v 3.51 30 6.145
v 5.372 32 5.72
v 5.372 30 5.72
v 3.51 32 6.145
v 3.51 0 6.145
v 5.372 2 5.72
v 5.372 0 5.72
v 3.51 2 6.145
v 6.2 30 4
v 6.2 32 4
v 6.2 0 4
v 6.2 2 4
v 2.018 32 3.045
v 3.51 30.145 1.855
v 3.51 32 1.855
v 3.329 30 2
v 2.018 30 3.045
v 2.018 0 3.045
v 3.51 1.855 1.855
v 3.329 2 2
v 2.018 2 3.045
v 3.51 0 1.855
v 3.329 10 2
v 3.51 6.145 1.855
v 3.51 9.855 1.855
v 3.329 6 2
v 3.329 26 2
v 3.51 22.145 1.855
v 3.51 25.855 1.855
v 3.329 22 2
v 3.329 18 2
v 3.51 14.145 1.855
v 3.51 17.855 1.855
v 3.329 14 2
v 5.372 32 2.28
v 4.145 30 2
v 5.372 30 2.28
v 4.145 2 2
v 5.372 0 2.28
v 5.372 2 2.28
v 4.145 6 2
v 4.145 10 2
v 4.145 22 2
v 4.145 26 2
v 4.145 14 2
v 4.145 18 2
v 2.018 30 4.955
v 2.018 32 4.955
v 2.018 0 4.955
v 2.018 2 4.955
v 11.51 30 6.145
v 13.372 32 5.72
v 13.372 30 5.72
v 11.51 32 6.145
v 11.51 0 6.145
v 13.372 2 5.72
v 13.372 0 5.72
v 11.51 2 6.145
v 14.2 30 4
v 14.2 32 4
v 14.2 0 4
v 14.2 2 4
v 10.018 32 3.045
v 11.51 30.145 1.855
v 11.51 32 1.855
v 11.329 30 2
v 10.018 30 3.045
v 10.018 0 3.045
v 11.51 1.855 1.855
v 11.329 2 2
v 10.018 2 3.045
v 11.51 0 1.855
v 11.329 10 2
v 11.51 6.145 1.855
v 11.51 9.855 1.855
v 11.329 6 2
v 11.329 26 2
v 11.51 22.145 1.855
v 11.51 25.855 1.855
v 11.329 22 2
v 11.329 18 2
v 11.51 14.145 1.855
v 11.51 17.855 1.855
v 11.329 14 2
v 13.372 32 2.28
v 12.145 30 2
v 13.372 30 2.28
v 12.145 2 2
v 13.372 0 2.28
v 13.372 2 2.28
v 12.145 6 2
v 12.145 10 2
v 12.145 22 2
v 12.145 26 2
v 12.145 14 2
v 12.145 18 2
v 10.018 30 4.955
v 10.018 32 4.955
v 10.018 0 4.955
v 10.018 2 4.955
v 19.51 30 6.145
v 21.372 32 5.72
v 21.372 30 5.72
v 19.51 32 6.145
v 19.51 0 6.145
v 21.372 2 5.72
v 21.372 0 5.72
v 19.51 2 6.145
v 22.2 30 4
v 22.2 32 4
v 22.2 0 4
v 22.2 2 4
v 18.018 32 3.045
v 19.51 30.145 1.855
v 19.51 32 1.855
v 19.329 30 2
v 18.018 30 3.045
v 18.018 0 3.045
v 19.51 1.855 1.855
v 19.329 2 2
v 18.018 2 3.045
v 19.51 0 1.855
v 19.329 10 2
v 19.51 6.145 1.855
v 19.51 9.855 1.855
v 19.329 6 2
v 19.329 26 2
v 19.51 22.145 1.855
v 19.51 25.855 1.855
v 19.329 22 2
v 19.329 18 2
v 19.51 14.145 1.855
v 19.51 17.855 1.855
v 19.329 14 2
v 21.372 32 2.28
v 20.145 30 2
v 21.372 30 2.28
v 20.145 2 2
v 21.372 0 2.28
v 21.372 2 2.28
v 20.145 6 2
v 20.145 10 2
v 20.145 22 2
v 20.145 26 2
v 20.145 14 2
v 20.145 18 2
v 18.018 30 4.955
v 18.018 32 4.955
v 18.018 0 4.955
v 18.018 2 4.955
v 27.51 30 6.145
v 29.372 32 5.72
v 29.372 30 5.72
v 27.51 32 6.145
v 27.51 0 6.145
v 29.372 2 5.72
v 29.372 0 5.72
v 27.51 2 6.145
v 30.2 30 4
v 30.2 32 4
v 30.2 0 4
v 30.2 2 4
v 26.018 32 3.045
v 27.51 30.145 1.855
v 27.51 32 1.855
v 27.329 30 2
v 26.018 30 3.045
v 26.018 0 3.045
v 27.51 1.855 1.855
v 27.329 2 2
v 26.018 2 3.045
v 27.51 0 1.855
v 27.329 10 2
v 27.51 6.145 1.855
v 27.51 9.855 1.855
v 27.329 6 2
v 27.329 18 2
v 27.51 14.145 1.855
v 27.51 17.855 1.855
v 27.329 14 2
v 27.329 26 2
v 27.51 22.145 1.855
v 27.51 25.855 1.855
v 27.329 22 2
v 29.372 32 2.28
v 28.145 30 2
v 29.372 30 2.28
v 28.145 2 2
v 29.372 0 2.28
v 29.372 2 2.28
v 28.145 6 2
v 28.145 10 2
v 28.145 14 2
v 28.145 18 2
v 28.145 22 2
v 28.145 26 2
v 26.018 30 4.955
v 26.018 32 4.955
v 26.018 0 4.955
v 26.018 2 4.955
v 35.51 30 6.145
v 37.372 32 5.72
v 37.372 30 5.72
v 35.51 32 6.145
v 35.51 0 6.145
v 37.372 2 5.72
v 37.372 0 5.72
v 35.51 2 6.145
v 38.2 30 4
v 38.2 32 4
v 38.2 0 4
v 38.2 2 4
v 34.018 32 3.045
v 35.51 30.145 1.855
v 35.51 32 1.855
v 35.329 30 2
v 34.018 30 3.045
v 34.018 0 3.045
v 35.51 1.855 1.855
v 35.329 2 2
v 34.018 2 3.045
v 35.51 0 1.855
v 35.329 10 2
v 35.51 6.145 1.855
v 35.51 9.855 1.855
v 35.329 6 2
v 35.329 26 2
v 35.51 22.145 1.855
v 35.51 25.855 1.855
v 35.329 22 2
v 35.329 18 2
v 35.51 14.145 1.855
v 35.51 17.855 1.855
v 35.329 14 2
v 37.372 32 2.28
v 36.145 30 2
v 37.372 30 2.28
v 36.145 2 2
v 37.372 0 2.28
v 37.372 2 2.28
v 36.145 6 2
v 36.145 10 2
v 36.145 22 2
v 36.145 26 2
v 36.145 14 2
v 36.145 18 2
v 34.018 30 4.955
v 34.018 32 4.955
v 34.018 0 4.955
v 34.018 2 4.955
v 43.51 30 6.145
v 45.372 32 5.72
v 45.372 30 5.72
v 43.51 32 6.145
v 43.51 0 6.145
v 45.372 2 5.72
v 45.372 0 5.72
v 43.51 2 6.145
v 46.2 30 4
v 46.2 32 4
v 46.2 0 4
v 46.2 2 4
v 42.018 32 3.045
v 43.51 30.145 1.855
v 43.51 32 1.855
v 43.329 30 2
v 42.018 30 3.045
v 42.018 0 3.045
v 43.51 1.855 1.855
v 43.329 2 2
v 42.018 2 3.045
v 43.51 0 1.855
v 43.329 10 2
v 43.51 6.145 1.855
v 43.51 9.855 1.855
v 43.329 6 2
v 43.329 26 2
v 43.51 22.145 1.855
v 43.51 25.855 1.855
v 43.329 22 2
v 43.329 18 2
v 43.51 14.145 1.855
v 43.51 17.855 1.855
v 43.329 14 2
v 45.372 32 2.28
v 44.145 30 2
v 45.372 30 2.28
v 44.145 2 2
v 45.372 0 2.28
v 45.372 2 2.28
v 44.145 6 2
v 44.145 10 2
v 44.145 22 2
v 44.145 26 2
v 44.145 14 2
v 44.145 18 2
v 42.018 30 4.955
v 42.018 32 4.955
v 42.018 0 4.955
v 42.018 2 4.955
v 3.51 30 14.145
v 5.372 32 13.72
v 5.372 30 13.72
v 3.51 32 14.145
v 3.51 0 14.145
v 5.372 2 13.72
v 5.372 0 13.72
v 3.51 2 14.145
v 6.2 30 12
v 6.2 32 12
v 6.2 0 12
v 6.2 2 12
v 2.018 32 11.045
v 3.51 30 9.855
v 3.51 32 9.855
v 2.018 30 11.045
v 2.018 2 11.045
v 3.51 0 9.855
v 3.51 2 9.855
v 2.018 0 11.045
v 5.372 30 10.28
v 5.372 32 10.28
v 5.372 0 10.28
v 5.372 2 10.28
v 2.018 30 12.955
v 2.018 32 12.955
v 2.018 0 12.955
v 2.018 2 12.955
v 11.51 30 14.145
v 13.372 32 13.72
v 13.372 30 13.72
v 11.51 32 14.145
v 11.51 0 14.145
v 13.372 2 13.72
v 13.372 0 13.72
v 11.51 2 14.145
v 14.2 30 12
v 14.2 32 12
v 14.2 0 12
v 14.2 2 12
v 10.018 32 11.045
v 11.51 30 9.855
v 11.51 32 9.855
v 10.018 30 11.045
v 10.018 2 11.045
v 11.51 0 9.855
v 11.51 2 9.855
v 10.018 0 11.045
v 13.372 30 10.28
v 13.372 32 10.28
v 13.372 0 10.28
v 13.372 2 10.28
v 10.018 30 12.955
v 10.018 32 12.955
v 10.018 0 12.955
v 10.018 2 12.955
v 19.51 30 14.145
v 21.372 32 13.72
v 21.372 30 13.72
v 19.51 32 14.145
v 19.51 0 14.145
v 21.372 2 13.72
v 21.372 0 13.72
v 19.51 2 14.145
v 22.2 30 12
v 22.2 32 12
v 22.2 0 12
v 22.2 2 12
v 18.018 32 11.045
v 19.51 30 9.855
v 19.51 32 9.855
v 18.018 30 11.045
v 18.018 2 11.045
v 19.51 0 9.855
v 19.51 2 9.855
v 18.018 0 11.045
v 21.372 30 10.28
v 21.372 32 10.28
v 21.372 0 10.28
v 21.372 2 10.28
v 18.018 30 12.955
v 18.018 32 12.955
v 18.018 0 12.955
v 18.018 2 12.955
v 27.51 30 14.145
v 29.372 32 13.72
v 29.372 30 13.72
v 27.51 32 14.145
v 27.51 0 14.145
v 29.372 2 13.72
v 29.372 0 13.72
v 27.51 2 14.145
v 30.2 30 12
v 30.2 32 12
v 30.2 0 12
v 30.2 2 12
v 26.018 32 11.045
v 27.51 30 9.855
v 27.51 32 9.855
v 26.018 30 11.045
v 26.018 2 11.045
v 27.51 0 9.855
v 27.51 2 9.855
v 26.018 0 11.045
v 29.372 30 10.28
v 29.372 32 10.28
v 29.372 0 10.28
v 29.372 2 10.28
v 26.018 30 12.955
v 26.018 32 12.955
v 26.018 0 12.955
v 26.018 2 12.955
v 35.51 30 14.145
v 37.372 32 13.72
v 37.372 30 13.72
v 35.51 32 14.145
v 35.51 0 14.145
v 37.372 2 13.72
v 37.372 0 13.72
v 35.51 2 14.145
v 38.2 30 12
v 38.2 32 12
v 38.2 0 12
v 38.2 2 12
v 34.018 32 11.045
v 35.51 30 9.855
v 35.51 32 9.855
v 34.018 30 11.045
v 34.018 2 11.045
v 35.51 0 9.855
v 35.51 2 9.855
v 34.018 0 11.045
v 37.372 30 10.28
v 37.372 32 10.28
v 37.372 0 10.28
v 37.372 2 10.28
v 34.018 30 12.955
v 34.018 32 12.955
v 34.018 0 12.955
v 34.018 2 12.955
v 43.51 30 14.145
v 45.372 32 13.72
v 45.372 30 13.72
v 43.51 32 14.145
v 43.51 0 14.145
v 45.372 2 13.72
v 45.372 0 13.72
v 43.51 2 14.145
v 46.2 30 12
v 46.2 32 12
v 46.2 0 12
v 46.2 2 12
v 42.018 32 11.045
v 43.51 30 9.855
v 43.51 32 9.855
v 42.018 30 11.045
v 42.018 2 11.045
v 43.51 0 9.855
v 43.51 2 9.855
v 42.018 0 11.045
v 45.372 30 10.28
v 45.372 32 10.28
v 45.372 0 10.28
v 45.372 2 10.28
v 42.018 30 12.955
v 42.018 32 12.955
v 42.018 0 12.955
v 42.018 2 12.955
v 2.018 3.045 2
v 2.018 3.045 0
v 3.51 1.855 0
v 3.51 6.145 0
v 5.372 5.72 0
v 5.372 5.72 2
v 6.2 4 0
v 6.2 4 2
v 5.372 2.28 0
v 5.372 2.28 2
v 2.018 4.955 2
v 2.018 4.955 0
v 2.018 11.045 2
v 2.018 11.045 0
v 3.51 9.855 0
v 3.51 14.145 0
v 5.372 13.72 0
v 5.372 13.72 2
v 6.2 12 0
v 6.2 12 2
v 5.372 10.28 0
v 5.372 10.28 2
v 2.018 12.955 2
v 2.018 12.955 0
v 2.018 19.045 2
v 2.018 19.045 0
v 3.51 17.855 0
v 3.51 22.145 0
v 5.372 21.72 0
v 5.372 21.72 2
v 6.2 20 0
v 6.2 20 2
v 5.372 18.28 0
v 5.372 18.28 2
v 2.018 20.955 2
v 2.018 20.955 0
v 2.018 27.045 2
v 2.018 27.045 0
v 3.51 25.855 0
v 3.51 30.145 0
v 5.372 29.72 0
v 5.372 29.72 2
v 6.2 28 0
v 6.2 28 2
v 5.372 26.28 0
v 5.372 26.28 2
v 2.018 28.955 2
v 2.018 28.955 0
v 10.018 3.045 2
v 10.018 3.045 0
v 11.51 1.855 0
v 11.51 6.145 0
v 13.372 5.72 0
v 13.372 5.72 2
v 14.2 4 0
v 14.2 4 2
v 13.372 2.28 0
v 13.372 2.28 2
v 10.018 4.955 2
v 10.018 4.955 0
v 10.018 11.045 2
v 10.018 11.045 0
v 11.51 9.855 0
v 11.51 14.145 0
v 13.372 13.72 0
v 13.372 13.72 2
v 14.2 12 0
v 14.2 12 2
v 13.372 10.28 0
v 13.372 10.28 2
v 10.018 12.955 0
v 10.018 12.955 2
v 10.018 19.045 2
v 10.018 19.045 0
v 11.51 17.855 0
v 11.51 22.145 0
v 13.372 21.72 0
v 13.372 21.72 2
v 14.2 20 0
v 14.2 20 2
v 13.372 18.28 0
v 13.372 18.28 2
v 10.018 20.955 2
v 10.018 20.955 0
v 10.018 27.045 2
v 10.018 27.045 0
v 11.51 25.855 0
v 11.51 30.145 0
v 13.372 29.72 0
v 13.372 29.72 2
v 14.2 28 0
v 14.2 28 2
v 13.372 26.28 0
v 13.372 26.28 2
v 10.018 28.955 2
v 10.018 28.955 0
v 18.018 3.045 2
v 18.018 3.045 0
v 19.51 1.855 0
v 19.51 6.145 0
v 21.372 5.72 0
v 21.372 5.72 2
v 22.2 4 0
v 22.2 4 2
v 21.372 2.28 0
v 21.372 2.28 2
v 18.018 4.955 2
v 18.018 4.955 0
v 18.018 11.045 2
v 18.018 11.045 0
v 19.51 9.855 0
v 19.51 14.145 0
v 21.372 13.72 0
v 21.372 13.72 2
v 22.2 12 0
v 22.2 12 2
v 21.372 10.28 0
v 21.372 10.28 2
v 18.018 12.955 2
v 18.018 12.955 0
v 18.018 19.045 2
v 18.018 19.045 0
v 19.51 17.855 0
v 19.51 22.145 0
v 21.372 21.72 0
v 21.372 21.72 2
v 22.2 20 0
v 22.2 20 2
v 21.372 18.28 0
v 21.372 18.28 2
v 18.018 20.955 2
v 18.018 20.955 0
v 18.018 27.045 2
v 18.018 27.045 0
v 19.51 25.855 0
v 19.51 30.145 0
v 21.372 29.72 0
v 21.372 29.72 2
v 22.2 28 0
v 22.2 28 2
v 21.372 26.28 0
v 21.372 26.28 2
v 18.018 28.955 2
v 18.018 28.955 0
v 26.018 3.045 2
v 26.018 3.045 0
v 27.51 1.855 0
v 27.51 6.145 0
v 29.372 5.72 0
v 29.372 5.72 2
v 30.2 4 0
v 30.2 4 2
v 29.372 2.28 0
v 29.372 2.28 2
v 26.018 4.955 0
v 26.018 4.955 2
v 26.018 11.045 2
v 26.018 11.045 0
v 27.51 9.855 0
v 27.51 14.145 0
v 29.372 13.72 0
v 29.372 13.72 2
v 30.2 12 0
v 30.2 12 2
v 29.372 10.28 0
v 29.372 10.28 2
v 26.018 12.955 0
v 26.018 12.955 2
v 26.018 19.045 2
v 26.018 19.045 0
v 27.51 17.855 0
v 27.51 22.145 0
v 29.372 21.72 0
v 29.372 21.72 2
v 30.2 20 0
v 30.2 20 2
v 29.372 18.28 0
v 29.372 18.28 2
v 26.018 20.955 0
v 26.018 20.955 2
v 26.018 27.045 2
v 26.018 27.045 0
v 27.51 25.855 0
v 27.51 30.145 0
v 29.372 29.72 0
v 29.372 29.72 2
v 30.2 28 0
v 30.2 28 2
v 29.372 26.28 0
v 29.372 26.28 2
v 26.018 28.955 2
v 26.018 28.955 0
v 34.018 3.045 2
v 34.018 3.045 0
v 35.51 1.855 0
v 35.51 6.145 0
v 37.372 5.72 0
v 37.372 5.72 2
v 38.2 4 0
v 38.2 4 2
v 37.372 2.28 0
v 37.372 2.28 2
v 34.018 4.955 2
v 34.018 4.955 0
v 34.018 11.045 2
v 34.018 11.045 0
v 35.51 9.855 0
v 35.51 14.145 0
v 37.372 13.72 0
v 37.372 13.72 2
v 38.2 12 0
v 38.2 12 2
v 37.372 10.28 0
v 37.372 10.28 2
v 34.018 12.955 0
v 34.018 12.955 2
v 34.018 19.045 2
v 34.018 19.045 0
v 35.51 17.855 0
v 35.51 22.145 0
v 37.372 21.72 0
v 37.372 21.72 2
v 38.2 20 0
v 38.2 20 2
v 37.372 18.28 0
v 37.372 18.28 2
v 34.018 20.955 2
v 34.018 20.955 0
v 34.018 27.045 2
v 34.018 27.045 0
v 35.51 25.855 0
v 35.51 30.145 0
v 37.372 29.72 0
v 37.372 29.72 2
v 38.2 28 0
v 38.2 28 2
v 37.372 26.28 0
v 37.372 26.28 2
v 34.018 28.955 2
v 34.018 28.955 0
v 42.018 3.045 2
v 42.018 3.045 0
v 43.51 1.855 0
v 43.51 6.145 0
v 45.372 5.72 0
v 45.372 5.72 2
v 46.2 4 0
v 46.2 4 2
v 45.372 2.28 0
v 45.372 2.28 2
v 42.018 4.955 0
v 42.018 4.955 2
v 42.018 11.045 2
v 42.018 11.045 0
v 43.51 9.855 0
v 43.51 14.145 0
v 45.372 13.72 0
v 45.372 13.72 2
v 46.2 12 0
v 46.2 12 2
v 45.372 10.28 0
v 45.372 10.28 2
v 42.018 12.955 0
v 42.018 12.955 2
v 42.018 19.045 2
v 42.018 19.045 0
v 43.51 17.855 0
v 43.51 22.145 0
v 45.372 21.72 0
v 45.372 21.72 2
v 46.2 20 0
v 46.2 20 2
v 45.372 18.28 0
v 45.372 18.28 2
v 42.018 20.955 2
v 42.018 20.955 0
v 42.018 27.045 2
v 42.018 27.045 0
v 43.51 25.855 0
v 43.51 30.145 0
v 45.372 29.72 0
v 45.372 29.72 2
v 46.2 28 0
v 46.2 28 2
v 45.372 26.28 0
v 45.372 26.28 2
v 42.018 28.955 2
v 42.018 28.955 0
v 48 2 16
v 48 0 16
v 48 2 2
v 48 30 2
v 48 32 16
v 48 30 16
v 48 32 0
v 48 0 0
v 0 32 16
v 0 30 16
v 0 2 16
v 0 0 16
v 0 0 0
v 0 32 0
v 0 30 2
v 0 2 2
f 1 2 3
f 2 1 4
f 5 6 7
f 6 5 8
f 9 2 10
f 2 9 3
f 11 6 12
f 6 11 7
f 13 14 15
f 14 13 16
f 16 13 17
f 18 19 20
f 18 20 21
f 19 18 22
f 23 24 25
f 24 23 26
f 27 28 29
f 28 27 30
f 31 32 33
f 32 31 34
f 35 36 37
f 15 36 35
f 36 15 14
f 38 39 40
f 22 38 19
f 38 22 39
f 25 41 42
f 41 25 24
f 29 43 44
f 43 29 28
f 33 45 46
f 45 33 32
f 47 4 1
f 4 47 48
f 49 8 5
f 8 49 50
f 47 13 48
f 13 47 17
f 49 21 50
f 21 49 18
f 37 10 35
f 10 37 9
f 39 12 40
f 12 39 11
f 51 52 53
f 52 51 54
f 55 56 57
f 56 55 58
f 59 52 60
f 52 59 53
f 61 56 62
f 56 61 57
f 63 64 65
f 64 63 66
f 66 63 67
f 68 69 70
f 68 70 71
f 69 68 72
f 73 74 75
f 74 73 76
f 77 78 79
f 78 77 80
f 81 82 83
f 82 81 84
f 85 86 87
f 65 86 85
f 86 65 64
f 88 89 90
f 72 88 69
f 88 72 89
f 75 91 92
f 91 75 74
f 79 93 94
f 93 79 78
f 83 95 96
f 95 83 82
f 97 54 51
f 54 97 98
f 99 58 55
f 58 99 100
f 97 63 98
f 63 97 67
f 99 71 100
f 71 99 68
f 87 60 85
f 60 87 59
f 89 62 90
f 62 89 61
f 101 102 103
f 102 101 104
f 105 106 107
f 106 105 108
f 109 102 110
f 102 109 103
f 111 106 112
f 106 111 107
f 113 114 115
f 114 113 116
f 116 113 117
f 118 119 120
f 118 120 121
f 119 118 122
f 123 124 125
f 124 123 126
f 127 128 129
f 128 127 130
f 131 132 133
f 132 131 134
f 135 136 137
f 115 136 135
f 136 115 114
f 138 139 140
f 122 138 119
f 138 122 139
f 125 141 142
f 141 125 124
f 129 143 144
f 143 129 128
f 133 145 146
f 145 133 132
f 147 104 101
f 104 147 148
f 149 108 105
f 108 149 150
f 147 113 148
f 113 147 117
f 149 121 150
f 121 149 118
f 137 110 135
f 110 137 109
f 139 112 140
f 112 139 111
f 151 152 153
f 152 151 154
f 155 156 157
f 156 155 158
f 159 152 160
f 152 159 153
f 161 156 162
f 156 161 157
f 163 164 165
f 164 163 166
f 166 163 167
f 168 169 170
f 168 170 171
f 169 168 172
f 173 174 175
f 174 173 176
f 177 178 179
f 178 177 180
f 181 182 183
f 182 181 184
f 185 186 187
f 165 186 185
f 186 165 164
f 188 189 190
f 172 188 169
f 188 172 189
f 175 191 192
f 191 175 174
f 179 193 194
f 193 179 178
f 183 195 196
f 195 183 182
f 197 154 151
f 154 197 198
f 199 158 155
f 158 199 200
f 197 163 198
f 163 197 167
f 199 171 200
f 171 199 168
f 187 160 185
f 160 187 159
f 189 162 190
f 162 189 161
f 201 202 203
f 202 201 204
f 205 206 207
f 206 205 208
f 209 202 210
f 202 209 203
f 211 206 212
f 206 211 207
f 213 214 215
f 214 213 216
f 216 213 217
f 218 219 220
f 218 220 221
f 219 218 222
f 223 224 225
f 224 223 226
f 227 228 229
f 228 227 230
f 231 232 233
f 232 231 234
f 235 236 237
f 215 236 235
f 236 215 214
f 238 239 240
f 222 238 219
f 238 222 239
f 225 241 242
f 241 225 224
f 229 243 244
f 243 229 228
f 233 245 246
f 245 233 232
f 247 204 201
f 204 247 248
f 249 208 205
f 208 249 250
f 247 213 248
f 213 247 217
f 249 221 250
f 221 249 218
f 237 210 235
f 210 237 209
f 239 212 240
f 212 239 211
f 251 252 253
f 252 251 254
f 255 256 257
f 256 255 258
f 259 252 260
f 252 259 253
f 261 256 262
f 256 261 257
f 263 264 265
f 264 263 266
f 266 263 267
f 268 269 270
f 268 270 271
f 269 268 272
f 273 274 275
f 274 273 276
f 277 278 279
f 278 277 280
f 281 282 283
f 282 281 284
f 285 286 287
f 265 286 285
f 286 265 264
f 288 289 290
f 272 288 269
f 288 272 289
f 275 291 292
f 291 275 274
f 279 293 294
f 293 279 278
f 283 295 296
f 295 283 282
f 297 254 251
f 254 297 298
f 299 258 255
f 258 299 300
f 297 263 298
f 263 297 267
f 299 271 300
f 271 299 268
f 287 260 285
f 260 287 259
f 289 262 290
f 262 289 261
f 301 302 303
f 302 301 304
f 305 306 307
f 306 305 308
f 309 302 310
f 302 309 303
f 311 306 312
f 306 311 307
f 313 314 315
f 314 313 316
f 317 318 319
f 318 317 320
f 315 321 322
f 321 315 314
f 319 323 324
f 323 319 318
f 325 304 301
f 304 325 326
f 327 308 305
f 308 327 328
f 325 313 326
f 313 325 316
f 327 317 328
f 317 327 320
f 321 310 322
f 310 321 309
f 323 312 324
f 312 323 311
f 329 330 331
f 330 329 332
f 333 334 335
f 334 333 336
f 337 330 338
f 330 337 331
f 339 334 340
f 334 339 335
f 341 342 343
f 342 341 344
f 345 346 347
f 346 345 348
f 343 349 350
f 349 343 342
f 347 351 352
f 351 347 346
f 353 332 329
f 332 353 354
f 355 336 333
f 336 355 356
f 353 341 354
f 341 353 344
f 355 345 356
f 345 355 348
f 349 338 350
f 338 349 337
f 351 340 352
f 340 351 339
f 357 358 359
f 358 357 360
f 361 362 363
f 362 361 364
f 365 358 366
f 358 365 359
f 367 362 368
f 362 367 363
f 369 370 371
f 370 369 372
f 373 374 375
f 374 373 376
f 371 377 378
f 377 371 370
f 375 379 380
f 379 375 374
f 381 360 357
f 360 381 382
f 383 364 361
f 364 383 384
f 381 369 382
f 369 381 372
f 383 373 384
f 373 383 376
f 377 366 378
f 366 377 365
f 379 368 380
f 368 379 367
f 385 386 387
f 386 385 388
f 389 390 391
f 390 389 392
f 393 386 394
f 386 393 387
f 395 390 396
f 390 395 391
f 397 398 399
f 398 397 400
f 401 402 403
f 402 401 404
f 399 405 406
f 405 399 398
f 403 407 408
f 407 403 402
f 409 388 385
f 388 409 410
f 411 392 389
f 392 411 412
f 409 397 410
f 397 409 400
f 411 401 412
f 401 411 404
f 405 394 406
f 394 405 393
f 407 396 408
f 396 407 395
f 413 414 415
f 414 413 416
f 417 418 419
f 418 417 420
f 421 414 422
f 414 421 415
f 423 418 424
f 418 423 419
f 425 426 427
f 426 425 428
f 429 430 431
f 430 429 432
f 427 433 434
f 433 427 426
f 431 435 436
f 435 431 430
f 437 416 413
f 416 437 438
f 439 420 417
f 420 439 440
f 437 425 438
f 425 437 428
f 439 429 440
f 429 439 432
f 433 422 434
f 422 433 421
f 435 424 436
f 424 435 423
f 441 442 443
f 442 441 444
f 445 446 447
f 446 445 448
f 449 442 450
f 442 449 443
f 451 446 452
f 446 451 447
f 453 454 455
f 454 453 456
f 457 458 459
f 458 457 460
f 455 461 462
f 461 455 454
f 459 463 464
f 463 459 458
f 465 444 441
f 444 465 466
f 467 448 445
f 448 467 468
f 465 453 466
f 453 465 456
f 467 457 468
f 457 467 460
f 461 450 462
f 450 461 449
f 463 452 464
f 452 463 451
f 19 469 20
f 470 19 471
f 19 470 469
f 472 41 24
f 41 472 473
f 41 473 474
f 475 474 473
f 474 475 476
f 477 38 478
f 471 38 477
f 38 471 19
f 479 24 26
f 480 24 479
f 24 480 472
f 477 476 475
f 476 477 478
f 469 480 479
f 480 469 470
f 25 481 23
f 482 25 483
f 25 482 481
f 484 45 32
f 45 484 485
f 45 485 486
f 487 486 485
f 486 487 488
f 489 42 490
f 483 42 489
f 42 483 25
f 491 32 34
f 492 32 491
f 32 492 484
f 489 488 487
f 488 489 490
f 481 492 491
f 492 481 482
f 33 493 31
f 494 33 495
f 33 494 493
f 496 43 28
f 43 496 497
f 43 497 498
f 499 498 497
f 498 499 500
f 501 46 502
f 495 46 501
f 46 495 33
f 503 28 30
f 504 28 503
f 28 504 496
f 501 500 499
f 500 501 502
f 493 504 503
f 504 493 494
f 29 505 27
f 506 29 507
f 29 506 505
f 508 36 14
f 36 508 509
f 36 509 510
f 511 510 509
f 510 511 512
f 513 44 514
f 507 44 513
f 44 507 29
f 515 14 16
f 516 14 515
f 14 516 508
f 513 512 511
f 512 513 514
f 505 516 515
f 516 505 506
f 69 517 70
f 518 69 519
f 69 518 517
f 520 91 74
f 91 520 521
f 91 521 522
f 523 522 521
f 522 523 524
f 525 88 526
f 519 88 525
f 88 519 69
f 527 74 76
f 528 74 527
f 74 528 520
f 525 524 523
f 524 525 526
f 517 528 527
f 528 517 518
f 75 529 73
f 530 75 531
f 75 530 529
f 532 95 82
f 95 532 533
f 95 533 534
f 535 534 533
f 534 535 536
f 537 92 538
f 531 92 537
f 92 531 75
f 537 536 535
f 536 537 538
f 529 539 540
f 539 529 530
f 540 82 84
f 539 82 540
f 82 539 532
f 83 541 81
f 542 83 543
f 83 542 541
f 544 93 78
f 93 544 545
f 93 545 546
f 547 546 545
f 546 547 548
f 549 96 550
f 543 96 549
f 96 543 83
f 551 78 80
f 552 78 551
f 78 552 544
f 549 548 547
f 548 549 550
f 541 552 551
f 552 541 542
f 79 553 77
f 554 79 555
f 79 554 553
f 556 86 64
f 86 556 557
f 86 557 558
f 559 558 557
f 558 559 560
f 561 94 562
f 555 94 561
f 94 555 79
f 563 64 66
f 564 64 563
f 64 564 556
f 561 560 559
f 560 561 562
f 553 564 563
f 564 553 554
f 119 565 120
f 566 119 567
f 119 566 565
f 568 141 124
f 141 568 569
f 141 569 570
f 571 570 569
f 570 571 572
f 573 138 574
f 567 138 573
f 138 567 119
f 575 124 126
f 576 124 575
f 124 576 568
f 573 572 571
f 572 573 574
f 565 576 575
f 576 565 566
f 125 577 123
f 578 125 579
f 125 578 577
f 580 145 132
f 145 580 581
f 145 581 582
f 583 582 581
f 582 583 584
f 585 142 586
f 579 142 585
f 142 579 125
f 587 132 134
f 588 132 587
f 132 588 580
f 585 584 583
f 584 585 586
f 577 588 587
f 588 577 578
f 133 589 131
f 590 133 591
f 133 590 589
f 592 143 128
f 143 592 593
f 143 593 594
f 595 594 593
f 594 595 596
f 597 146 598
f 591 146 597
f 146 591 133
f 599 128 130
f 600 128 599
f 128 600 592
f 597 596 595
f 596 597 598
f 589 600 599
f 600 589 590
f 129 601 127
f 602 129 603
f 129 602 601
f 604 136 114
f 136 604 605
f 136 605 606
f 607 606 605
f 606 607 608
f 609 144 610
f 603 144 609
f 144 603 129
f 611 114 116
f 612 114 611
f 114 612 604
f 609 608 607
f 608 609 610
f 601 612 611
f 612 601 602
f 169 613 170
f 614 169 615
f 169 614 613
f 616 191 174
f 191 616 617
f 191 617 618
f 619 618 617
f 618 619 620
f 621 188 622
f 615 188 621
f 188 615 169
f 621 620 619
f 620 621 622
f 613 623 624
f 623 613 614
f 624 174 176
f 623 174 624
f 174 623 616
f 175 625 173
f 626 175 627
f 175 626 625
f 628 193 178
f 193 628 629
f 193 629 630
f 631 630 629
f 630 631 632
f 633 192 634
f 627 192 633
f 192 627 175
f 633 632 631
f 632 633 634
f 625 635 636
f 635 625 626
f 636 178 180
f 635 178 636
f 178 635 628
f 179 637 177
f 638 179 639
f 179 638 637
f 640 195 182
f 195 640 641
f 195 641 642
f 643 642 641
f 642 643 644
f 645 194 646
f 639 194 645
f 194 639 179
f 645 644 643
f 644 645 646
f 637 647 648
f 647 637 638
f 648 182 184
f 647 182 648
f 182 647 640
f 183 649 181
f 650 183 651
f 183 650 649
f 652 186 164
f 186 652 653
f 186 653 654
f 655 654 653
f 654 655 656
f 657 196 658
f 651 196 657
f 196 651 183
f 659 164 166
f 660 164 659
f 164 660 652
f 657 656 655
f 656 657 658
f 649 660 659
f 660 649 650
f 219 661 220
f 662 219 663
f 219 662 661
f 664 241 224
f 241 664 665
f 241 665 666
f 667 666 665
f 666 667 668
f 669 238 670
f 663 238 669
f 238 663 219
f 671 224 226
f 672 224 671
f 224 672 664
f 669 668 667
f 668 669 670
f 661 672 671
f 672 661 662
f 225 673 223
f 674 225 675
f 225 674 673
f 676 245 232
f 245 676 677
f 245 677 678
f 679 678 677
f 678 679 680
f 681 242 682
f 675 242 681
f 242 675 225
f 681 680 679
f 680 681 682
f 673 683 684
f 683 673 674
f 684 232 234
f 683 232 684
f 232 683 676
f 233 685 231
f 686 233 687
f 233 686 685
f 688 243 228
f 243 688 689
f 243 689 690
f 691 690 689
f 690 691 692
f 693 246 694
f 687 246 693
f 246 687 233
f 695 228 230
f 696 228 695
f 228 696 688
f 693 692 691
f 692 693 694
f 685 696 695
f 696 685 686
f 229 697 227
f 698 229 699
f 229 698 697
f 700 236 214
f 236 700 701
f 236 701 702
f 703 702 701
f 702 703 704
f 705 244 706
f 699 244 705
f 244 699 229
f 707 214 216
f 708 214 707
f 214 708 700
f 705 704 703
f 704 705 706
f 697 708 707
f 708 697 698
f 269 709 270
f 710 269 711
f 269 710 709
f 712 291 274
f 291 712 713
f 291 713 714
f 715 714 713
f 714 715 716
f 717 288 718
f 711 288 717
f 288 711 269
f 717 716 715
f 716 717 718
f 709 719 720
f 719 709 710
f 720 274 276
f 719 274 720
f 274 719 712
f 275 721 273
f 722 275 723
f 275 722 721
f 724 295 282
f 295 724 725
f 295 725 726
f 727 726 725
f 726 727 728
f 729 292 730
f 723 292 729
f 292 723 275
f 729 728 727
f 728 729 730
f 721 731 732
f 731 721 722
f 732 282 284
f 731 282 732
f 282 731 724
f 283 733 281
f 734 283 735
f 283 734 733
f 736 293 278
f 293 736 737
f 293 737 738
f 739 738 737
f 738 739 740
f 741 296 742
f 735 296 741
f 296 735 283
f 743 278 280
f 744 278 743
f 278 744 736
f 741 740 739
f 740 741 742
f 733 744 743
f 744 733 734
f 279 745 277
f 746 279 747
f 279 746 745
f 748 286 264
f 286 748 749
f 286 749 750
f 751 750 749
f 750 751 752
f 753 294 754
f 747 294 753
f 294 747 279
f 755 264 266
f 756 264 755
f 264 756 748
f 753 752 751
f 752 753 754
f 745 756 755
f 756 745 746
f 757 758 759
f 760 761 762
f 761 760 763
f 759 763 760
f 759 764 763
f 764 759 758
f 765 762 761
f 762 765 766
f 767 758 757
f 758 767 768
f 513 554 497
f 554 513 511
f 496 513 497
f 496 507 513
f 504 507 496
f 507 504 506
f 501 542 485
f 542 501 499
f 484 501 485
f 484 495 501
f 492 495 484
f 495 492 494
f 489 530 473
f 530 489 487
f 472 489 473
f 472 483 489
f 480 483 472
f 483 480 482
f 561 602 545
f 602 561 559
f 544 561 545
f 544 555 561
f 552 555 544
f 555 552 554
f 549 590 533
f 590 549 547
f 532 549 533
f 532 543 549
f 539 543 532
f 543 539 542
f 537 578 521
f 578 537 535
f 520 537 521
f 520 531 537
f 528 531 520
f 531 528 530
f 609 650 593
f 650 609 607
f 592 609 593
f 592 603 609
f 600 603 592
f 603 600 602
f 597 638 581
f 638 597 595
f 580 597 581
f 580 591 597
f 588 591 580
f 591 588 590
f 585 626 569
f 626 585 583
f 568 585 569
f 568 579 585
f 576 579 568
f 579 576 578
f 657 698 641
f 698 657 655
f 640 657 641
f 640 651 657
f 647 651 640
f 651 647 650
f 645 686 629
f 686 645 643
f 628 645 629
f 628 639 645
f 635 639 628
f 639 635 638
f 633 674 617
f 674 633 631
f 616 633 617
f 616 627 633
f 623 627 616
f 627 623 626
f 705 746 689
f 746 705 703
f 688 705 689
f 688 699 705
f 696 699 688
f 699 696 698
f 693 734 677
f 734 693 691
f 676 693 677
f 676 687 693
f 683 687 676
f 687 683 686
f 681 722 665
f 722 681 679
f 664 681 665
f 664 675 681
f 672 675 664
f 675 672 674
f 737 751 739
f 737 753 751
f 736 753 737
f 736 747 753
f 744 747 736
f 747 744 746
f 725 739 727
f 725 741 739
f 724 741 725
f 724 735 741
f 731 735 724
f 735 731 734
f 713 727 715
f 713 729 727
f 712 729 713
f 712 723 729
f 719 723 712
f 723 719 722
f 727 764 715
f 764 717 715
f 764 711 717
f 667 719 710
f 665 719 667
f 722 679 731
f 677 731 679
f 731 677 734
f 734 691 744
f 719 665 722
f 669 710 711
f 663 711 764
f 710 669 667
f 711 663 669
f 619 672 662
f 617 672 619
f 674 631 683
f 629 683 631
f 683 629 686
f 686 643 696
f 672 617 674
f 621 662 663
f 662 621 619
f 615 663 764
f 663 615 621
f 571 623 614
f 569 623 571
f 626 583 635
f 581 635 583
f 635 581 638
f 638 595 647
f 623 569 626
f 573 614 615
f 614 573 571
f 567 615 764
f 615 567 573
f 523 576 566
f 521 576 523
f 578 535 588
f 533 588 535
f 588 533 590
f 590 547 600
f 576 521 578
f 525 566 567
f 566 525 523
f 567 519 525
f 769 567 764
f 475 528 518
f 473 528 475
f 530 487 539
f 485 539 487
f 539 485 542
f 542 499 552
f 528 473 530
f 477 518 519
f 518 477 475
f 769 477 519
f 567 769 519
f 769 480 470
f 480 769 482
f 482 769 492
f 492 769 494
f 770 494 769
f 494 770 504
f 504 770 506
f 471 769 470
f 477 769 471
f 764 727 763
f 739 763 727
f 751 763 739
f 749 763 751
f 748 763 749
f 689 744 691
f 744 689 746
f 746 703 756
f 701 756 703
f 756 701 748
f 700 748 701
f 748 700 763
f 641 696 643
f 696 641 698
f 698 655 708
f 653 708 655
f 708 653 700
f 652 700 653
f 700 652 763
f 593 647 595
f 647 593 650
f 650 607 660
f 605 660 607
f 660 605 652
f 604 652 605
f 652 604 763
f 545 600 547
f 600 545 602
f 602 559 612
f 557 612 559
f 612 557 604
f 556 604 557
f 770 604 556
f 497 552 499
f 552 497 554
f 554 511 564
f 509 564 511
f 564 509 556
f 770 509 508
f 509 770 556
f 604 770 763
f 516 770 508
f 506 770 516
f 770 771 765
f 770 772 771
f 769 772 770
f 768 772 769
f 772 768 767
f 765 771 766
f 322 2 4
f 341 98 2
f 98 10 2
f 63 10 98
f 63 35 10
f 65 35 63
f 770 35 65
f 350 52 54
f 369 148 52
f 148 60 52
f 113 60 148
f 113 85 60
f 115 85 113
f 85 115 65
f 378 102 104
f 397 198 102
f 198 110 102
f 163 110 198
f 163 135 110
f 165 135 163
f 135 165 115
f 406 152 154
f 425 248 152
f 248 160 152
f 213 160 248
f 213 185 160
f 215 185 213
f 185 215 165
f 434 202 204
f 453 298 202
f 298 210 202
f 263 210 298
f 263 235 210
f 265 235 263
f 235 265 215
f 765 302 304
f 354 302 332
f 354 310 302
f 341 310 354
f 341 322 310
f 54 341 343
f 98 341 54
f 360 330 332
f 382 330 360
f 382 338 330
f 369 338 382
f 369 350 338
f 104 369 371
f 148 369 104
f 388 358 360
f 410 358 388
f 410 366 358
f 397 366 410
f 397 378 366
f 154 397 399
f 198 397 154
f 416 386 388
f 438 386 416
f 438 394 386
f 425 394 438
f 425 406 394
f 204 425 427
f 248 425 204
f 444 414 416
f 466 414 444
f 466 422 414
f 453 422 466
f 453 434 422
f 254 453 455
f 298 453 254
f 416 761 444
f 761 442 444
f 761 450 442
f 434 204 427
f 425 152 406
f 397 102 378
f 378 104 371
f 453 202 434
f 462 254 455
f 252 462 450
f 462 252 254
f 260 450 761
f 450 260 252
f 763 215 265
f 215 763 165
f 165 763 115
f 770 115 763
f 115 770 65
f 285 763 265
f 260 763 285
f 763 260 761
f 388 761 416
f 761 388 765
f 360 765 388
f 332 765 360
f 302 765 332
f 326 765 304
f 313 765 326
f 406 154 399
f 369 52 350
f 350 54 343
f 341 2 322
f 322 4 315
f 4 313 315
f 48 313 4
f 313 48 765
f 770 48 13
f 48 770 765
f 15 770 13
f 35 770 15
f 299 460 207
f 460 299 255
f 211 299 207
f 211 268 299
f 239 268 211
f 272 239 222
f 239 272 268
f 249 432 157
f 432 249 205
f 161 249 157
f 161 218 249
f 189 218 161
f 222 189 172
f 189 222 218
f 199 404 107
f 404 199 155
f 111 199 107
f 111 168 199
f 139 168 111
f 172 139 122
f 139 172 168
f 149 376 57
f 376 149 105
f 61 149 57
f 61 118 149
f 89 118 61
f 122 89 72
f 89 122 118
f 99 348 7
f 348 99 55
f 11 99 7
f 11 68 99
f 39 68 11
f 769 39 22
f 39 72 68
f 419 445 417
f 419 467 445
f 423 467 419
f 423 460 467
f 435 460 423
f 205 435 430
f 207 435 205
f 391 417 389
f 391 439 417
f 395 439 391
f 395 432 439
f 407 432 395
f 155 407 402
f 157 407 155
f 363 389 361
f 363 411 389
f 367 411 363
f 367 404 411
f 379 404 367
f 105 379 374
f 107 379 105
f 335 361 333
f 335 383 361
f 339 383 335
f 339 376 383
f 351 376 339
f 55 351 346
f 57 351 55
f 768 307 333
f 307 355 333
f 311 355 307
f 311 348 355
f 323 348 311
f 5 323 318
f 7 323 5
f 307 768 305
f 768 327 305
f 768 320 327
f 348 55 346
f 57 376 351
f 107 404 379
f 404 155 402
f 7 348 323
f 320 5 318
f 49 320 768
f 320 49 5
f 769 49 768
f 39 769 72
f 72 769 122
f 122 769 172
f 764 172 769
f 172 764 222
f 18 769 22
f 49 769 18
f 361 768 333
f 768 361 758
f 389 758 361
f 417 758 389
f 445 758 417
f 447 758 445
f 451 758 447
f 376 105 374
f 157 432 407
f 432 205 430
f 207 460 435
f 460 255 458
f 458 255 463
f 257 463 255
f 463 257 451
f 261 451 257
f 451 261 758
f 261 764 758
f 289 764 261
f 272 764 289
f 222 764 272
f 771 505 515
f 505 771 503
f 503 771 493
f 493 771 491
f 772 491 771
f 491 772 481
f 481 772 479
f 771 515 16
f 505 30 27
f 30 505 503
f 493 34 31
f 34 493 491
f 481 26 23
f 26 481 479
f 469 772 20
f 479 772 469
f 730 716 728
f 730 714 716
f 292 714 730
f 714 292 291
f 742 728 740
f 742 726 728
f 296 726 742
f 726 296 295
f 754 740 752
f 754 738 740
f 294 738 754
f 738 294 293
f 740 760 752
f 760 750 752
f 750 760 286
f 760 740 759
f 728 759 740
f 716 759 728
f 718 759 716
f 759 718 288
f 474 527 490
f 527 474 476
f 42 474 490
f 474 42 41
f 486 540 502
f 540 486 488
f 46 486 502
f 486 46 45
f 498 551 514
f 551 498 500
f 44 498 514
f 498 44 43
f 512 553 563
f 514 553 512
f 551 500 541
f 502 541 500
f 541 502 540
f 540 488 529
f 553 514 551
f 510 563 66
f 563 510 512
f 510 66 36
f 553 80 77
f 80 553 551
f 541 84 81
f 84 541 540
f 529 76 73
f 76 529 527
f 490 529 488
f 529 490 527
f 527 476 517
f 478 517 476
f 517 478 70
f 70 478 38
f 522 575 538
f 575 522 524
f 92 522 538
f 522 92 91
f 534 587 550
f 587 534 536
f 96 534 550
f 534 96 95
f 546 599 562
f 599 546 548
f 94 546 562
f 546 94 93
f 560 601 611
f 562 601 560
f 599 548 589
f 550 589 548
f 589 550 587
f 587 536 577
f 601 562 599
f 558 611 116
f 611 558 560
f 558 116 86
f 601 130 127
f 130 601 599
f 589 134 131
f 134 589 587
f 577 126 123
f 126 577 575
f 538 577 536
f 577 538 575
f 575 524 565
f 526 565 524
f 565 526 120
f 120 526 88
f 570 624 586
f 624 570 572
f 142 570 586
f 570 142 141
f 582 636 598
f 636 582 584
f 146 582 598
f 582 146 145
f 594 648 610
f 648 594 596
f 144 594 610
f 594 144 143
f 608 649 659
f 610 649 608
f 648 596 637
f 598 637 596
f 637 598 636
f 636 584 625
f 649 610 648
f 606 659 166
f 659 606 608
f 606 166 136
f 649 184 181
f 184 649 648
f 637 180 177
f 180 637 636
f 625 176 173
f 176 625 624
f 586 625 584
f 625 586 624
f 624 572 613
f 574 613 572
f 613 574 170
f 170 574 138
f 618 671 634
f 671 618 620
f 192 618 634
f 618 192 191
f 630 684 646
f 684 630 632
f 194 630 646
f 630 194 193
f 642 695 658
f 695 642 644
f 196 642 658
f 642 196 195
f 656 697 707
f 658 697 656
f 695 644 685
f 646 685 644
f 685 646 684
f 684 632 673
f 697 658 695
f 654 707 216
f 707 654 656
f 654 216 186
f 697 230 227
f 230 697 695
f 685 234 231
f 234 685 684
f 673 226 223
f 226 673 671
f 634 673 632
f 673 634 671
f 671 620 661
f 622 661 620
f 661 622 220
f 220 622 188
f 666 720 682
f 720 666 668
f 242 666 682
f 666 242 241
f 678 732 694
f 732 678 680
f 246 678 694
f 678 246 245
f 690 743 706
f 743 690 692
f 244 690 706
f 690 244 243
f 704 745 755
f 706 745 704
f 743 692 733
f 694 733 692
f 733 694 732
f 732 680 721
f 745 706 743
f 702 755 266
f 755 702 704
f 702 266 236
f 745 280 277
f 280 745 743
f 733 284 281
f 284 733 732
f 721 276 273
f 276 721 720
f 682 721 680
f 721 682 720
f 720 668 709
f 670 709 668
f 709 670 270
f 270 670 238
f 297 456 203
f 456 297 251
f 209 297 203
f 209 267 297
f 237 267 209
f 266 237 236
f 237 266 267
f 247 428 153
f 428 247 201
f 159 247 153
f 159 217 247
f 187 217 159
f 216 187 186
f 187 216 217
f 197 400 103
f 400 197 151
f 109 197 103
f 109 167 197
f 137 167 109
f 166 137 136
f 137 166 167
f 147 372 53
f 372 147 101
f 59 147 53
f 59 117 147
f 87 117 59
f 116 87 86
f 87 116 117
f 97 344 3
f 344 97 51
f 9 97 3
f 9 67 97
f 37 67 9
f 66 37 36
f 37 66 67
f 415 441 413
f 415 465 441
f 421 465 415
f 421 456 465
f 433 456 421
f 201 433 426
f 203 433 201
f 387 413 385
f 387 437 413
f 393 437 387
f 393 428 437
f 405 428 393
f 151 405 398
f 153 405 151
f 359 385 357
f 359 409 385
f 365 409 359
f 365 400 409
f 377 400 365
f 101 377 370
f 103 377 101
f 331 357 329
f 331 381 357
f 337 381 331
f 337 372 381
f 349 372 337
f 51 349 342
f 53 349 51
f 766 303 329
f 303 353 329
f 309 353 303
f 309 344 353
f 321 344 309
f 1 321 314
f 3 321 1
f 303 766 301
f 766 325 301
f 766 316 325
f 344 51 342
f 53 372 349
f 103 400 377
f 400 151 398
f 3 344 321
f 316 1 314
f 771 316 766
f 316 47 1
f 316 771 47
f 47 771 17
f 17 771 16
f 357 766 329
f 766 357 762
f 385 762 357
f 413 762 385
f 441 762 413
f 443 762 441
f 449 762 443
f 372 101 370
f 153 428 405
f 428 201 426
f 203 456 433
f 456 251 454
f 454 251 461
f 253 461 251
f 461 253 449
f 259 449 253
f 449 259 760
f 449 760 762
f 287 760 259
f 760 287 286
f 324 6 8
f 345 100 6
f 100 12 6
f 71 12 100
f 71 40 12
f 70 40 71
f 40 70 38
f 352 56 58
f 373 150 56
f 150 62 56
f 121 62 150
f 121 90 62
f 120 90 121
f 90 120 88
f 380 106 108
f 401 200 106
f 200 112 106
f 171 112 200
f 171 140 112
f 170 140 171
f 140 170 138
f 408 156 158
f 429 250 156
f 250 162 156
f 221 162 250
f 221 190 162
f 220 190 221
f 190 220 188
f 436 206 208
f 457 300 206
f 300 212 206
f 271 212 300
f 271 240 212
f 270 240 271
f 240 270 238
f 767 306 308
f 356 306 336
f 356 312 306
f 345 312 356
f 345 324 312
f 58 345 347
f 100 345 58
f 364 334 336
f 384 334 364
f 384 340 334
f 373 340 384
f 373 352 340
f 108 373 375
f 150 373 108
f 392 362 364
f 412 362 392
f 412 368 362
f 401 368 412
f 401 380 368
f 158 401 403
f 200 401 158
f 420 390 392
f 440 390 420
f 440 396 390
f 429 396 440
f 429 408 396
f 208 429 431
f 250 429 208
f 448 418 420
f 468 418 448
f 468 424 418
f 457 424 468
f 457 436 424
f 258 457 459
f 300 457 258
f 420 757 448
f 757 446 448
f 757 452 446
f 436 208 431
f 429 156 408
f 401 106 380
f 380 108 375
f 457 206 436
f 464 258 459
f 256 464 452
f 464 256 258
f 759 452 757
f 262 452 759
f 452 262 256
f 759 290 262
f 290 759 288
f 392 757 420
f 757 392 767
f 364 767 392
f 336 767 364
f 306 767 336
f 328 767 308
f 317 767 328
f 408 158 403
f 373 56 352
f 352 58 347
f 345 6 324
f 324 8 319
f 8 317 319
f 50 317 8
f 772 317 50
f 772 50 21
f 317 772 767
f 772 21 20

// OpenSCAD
// configuration
space = 4;
hole = 4;
pad = space/2;
length = 6;
width = 4;
height = 2;

l = length*hole + (length-1)*space + 2*pad;
w = width*hole + (width-1)*space + 2*pad;
h = height*hole + (height-1)*space + 2*pad;

difference() {
    
    // total piece
    cube([l, w, h]);
    
    // hollow internal
    translate([-pad, pad, pad]) {
        cube([l + 2*pad, w - 2*pad, h]);
    };
    
    // horizontal holes
    for(j=[1:height])  {
        for(i=[1:length]) {
            translate([
                i*hole + (i - 1)*space - hole/2 + pad,
                w/2,
                j*hole + (j - 1)*space - hole/2 + pad
            ]) {
                rotate([90, 0, 0]) {
                    translate([0, 0, -w/2 -pad]) {
                        cylinder(h=w + 2*pad, r=hole/2 + 0.2);
                    };
                };
            };
        };
    };

    for (i=[1:length]) {
        for (j=[1:width]) {
            translate([
                i*hole + (i-1)*space - hole/2 + pad,
                j*hole + (j-1)*space - hole/2 + pad,
                -pad
            ]) {
                cylinder(h=3*pad, r=hole/2 + 0.2);
            }
        }
    }
};
